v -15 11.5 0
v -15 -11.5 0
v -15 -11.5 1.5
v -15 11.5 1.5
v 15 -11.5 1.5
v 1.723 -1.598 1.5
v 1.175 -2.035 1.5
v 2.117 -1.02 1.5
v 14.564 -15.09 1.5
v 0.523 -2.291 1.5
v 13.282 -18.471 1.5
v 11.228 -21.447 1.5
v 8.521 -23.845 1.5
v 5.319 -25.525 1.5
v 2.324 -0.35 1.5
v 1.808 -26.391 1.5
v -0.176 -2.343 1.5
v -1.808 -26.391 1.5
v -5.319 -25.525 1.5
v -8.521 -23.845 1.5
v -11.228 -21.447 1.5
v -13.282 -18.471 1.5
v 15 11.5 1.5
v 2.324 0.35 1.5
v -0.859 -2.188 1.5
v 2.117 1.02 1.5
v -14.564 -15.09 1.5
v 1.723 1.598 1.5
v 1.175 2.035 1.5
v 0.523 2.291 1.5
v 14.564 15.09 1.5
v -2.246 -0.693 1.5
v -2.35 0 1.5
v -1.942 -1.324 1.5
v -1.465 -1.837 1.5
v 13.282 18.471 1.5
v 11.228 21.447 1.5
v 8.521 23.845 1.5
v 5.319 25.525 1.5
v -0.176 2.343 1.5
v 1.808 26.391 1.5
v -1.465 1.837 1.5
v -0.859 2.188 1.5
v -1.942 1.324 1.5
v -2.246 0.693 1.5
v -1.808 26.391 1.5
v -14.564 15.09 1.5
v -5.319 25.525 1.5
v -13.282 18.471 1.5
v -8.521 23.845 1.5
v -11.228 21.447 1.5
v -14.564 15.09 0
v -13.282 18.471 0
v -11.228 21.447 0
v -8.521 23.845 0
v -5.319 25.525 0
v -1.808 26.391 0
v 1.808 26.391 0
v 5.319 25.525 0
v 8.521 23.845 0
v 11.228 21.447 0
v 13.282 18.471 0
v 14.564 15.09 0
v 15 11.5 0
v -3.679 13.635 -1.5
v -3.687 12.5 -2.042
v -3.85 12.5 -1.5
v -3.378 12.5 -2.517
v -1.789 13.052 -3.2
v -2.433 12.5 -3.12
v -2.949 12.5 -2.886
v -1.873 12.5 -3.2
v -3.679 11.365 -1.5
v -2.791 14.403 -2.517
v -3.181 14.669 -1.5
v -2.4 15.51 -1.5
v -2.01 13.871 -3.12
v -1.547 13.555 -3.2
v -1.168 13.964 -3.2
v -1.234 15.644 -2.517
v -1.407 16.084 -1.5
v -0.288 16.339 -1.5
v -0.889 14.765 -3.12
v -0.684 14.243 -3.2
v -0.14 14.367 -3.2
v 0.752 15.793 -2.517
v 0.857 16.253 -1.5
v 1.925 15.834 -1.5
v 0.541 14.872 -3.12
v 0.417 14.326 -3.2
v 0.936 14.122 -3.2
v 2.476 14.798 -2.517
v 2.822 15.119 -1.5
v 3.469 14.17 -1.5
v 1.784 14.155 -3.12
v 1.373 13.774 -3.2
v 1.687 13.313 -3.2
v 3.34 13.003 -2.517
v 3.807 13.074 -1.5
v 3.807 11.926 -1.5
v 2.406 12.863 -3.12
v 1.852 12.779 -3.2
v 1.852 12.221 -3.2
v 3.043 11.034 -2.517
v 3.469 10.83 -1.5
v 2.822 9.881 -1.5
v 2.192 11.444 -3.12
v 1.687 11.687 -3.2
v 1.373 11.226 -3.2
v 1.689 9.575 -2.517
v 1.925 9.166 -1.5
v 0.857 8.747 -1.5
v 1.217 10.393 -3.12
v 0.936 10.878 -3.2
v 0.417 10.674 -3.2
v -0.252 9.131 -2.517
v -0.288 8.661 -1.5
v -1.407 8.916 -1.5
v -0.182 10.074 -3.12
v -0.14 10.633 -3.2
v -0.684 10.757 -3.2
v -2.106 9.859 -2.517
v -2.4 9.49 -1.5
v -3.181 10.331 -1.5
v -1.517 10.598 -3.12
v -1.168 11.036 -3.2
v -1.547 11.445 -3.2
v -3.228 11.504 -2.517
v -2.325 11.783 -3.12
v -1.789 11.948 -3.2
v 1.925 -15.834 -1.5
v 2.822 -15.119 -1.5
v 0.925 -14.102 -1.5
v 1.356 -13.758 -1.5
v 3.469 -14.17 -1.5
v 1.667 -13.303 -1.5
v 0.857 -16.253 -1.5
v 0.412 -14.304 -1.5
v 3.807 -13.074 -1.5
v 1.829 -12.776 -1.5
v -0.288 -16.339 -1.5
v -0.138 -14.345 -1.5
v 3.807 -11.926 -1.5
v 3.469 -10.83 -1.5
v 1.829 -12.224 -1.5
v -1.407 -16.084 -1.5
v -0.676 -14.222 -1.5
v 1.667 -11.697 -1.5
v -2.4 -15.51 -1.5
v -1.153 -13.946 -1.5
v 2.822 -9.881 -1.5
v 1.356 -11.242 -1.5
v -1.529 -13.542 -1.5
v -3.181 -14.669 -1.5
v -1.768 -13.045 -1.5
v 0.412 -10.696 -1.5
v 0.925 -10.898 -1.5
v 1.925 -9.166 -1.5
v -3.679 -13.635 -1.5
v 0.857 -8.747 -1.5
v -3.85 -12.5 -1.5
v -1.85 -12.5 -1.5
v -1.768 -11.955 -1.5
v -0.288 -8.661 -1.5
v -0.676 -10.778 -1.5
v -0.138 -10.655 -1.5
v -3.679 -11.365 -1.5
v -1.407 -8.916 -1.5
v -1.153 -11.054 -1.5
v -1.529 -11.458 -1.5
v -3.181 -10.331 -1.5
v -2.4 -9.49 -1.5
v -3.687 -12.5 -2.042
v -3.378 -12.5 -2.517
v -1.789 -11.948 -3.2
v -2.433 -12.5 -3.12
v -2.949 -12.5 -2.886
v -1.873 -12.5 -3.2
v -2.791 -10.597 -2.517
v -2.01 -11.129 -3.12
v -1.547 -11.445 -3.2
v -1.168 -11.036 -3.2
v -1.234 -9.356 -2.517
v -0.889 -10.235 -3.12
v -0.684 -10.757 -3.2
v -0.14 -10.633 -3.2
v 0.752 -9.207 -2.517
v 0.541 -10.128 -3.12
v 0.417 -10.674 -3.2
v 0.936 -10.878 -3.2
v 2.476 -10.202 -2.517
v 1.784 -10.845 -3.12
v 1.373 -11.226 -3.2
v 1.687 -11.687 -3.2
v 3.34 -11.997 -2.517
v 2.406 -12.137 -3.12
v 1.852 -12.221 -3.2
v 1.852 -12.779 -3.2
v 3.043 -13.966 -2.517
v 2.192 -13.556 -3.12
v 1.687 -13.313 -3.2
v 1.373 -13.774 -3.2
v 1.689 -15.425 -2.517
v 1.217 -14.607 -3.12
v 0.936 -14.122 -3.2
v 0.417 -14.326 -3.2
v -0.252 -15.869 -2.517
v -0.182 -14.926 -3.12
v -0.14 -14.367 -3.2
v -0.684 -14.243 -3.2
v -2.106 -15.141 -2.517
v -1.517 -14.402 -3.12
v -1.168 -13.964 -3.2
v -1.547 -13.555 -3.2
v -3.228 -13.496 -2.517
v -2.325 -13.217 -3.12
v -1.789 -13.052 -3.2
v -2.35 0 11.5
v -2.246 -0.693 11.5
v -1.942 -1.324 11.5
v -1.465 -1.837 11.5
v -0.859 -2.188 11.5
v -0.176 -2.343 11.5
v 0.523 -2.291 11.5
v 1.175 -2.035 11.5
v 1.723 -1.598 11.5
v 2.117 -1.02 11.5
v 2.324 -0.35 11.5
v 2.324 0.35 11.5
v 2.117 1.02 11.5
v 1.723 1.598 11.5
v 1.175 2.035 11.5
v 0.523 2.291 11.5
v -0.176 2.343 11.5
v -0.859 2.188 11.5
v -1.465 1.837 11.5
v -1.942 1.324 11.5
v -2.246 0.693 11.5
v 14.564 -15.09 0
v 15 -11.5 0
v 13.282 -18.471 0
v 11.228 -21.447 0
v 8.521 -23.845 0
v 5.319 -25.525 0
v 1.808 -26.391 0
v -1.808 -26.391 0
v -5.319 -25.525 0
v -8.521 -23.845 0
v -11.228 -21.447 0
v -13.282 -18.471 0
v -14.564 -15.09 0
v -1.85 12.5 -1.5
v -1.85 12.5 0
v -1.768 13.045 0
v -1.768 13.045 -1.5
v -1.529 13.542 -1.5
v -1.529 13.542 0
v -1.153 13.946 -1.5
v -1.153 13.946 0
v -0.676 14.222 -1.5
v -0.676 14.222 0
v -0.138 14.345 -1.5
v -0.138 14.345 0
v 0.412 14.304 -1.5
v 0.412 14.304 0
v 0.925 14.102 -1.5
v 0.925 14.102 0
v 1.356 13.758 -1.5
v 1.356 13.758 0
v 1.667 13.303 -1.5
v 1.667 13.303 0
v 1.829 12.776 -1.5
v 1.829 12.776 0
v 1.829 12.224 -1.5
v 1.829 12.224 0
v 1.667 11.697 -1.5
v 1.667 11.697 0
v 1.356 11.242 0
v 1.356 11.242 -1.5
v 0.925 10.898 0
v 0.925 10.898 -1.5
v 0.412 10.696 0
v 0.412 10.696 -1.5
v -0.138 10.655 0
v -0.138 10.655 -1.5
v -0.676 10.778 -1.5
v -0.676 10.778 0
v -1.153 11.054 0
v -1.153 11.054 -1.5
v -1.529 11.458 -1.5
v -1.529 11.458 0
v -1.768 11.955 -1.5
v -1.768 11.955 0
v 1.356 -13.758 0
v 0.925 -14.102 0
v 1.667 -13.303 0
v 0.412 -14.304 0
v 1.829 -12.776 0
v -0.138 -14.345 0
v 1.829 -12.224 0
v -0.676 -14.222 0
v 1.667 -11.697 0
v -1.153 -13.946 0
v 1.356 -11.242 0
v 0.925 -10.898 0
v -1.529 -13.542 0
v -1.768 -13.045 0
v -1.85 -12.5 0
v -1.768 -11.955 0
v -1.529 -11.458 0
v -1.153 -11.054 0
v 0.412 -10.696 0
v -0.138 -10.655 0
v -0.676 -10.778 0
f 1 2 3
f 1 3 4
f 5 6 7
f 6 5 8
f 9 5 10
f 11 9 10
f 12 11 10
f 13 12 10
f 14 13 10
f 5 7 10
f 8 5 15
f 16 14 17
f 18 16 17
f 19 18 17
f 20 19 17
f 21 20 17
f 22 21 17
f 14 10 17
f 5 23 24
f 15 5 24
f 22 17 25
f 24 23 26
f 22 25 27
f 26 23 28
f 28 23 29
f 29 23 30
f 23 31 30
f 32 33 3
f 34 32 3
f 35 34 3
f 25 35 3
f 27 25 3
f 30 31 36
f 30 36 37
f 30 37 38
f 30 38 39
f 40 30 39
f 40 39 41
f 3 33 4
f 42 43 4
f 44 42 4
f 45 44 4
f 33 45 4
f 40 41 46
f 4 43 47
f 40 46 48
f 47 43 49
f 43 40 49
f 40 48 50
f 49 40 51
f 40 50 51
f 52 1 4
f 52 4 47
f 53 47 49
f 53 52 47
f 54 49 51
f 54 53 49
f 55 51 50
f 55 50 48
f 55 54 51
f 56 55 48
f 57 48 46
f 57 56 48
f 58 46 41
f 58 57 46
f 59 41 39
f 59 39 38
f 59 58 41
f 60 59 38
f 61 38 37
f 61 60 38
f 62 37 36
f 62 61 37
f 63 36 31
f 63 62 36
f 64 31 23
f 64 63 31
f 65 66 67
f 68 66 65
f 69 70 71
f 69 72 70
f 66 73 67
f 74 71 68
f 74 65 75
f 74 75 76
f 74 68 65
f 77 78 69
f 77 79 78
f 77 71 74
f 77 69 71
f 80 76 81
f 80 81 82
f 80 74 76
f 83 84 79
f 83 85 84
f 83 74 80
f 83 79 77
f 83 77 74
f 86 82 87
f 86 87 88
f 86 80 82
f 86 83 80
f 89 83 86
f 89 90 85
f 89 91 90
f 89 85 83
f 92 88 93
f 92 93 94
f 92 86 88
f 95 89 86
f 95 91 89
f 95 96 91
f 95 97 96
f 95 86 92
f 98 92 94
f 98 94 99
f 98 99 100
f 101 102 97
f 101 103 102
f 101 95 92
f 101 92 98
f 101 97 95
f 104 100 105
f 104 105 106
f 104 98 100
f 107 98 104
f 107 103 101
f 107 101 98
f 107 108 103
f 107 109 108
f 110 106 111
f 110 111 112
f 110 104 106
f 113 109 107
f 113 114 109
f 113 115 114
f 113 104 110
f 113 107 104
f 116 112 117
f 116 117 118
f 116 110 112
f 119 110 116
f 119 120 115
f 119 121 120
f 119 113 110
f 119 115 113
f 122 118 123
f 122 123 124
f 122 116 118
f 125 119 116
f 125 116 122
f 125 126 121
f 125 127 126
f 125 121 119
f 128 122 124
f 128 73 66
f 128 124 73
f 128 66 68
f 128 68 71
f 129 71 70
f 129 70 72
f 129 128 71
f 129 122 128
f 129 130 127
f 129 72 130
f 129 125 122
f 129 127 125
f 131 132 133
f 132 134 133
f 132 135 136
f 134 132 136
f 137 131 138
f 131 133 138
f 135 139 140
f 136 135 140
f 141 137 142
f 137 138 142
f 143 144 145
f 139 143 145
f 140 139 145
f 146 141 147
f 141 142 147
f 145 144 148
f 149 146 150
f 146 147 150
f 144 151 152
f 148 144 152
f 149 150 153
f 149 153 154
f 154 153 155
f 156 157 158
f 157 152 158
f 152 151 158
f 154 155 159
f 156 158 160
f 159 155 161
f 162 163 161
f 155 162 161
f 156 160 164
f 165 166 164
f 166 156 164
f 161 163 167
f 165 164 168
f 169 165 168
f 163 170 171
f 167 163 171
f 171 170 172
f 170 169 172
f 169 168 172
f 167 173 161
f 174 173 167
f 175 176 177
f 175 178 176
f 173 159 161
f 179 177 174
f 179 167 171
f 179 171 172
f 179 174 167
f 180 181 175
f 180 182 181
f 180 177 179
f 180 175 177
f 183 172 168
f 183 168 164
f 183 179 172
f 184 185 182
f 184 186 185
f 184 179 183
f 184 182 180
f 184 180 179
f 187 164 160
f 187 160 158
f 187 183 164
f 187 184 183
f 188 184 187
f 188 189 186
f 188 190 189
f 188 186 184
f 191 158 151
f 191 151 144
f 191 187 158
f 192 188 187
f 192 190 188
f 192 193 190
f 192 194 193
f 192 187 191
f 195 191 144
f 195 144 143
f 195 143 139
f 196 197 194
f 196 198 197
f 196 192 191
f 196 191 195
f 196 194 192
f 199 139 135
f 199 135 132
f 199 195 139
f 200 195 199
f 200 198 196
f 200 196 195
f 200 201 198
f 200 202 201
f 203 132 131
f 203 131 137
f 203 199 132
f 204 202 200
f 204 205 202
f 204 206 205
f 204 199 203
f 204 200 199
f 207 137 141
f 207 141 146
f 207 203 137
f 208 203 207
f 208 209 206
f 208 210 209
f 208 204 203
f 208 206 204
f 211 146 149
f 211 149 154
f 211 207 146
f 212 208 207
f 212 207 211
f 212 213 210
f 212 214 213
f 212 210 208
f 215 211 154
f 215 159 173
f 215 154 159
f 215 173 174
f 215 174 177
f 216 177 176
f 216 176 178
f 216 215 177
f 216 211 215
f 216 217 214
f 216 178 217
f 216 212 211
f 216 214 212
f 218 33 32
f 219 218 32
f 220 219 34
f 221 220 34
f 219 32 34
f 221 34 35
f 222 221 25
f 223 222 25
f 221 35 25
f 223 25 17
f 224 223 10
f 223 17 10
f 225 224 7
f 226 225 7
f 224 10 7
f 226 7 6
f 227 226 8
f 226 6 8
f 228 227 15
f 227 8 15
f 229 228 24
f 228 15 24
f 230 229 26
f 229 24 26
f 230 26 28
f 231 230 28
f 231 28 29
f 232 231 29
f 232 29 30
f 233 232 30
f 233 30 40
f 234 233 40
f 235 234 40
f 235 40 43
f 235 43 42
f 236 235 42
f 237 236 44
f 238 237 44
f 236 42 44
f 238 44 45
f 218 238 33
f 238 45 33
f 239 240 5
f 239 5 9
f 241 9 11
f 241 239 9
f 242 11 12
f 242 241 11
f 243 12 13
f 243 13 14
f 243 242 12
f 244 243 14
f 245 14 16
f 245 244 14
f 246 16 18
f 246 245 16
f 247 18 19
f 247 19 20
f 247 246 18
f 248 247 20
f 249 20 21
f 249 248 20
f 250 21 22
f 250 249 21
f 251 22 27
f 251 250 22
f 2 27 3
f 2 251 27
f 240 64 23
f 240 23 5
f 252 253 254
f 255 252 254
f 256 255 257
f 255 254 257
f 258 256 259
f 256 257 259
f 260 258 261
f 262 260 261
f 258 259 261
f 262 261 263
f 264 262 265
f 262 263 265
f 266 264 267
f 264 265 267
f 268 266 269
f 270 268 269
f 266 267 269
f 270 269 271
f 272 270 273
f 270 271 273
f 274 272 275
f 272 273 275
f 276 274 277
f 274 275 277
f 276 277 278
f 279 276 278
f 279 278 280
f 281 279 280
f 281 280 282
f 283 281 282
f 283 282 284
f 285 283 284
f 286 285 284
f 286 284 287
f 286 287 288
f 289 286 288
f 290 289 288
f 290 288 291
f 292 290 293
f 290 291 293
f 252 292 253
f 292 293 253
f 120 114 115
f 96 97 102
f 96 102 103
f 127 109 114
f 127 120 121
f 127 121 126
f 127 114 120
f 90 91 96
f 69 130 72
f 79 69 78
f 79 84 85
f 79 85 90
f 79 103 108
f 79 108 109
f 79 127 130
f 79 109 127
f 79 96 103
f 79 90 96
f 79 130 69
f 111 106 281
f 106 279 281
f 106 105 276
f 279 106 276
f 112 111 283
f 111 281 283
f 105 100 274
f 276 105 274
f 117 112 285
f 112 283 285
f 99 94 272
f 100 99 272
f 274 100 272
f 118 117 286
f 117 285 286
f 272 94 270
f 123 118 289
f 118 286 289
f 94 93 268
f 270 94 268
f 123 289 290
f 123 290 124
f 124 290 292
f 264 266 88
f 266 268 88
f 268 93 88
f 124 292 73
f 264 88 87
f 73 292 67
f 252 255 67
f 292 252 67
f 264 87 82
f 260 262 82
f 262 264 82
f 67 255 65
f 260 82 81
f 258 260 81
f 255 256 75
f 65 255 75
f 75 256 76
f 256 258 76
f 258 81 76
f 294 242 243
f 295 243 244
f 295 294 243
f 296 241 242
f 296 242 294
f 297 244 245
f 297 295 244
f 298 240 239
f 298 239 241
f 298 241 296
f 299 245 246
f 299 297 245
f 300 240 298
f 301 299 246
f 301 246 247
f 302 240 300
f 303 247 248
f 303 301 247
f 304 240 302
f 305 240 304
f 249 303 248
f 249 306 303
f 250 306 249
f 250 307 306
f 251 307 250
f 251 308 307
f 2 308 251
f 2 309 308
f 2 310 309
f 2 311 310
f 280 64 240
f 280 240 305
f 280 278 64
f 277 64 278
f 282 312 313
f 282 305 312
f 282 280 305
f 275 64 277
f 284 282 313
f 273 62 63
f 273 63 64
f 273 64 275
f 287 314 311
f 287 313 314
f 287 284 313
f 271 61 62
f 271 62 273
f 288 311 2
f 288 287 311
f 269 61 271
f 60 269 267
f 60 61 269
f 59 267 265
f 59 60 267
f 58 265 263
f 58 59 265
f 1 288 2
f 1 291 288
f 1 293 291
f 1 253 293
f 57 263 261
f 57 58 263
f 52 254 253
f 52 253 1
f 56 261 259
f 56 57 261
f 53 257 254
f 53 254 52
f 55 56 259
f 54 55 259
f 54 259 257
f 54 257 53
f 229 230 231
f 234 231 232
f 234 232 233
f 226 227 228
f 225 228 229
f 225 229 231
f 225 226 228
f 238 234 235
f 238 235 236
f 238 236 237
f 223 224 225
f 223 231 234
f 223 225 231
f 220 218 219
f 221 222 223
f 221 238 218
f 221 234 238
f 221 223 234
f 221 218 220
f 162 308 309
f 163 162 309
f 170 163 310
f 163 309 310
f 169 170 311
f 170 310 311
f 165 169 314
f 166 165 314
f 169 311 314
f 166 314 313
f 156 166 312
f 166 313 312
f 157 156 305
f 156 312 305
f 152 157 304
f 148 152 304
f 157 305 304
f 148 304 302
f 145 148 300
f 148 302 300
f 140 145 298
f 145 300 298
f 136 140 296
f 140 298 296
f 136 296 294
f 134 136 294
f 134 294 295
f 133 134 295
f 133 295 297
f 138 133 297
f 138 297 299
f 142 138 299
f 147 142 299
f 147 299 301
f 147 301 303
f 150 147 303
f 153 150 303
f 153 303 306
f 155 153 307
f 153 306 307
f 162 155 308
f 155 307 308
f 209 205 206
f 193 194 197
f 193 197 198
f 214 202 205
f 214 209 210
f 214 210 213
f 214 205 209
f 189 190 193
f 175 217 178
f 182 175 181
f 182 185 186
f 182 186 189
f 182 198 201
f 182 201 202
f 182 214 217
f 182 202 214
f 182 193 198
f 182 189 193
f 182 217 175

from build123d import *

# Parameters (mm, degrees)
DODANIE_WYCI_GNI_CIE2_DEPTH = 1.5
SZKIC37_R                   = 1.85
DODANIE_WYCI_GNI_CIE3_DEPTH = 1.5
SZKIC38_R                   = 3.85
DODANIE_WYCI_GNI_CIE4_DEPTH = 1.7
ZAOKR_GLENIE1_R             = 2
SZKIC39_R                   = 2.35
DODANIE_WYCI_GNI_CIE5_DEPTH = 10


with BuildPart() as part:
    # Szkic35 → Dodanie-wyciągnięcie2 (new body)
    with BuildSketch(Plane.XY):
        with BuildLine():
            Line((-15, -11.5), (-15, 11.5))
            ThreePointArc((-15, 11.5), (0, 26.5), (15, 11.5))
            Line((15, 11.5), (15, -11.5))
            ThreePointArc((15, -11.5), (0, -26.5), (-15, -11.5))
        make_face()
    extrude(amount=DODANIE_WYCI_GNI_CIE2_DEPTH)

    # Szkic37 → Dodanie-wyciągnięcie3 (add)
    with BuildSketch(Plane(origin=(0, 0, 0), x_dir=(-1, 0, 0), z_dir=(0, 0, -1))):
        with Locations((0, 12.5)):
            Circle(SZKIC37_R)
        with Locations((0, -12.5)):
            Circle(SZKIC37_R)
    extrude(amount=DODANIE_WYCI_GNI_CIE3_DEPTH)

    # Szkic38 → Dodanie-wyciągnięcie4 (add)
    with BuildSketch(Plane(origin=(0, 0, -1.5), x_dir=(-1, 0, 0), z_dir=(0, 0, -1))):
        with Locations((0, 12.5)):
            Circle(SZKIC38_R)
        with Locations((0, -12.5)):
            Circle(SZKIC38_R)
    extrude(amount=DODANIE_WYCI_GNI_CIE4_DEPTH)

    # Zaokrąglenie1
    # the kernel refuses this fillet: 2 mm, written as the material it takes off along each edge
    with BuildSketch(Plane(origin=(0, 12.5, -3.2), x_dir=(-1, 0, 0), z_dir=(0, -1, 0))) as zaokr_glenie1_piece_1:
        with BuildLine():
            CenterArc((1.872628007, -2), ZAOKR_GLENIE1_R, 8.626926559, 81.373073441)
            Line((1.872628007, 0), (1.872628007, 0.04))
            Line((1.872628007, 0.04), (3.85, 0.04))
            Line((3.85, 0.04), (3.89, 0))
            ThreePointArc((3.89, 0), (3.89, -0.85), (3.88954744, -1.694))
            Line((3.88954744, -1.694), (3.85, -1.7))
        make_face()
    revolve(axis=Axis((0, 12.5, -3.2), (0, 0, -1)), mode=Mode.SUBTRACT)
    with BuildSketch(Plane(origin=(0, -12.5, -3.2), x_dir=(-1, 0, 0), z_dir=(0, -1, 0))) as zaokr_glenie1_piece_2:
        with BuildLine():
            CenterArc((1.872628007, -2), ZAOKR_GLENIE1_R, 8.626926559, 81.373073441)
            Line((1.872628007, 0), (1.872628007, 0.04))
            Line((1.872628007, 0.04), (3.85, 0.04))
            Line((3.85, 0.04), (3.89, 0))
            ThreePointArc((3.89, 0), (3.89, -0.85), (3.88954744, -1.694))
            Line((3.88954744, -1.694), (3.85, -1.7))
        make_face()
    revolve(axis=Axis((0, -12.5, -3.2), (0, 0, -1)), mode=Mode.SUBTRACT)

    # Szkic39 → Dodanie-wyciągnięcie5 (add)
    with BuildSketch(Plane.XY.offset(1.5)):
        with Locations(Location((0, 0, 0), (0, 0, 180))):
            Circle(SZKIC39_R)
    extrude(amount=DODANIE_WYCI_GNI_CIE5_DEPTH)


solid = part.part
